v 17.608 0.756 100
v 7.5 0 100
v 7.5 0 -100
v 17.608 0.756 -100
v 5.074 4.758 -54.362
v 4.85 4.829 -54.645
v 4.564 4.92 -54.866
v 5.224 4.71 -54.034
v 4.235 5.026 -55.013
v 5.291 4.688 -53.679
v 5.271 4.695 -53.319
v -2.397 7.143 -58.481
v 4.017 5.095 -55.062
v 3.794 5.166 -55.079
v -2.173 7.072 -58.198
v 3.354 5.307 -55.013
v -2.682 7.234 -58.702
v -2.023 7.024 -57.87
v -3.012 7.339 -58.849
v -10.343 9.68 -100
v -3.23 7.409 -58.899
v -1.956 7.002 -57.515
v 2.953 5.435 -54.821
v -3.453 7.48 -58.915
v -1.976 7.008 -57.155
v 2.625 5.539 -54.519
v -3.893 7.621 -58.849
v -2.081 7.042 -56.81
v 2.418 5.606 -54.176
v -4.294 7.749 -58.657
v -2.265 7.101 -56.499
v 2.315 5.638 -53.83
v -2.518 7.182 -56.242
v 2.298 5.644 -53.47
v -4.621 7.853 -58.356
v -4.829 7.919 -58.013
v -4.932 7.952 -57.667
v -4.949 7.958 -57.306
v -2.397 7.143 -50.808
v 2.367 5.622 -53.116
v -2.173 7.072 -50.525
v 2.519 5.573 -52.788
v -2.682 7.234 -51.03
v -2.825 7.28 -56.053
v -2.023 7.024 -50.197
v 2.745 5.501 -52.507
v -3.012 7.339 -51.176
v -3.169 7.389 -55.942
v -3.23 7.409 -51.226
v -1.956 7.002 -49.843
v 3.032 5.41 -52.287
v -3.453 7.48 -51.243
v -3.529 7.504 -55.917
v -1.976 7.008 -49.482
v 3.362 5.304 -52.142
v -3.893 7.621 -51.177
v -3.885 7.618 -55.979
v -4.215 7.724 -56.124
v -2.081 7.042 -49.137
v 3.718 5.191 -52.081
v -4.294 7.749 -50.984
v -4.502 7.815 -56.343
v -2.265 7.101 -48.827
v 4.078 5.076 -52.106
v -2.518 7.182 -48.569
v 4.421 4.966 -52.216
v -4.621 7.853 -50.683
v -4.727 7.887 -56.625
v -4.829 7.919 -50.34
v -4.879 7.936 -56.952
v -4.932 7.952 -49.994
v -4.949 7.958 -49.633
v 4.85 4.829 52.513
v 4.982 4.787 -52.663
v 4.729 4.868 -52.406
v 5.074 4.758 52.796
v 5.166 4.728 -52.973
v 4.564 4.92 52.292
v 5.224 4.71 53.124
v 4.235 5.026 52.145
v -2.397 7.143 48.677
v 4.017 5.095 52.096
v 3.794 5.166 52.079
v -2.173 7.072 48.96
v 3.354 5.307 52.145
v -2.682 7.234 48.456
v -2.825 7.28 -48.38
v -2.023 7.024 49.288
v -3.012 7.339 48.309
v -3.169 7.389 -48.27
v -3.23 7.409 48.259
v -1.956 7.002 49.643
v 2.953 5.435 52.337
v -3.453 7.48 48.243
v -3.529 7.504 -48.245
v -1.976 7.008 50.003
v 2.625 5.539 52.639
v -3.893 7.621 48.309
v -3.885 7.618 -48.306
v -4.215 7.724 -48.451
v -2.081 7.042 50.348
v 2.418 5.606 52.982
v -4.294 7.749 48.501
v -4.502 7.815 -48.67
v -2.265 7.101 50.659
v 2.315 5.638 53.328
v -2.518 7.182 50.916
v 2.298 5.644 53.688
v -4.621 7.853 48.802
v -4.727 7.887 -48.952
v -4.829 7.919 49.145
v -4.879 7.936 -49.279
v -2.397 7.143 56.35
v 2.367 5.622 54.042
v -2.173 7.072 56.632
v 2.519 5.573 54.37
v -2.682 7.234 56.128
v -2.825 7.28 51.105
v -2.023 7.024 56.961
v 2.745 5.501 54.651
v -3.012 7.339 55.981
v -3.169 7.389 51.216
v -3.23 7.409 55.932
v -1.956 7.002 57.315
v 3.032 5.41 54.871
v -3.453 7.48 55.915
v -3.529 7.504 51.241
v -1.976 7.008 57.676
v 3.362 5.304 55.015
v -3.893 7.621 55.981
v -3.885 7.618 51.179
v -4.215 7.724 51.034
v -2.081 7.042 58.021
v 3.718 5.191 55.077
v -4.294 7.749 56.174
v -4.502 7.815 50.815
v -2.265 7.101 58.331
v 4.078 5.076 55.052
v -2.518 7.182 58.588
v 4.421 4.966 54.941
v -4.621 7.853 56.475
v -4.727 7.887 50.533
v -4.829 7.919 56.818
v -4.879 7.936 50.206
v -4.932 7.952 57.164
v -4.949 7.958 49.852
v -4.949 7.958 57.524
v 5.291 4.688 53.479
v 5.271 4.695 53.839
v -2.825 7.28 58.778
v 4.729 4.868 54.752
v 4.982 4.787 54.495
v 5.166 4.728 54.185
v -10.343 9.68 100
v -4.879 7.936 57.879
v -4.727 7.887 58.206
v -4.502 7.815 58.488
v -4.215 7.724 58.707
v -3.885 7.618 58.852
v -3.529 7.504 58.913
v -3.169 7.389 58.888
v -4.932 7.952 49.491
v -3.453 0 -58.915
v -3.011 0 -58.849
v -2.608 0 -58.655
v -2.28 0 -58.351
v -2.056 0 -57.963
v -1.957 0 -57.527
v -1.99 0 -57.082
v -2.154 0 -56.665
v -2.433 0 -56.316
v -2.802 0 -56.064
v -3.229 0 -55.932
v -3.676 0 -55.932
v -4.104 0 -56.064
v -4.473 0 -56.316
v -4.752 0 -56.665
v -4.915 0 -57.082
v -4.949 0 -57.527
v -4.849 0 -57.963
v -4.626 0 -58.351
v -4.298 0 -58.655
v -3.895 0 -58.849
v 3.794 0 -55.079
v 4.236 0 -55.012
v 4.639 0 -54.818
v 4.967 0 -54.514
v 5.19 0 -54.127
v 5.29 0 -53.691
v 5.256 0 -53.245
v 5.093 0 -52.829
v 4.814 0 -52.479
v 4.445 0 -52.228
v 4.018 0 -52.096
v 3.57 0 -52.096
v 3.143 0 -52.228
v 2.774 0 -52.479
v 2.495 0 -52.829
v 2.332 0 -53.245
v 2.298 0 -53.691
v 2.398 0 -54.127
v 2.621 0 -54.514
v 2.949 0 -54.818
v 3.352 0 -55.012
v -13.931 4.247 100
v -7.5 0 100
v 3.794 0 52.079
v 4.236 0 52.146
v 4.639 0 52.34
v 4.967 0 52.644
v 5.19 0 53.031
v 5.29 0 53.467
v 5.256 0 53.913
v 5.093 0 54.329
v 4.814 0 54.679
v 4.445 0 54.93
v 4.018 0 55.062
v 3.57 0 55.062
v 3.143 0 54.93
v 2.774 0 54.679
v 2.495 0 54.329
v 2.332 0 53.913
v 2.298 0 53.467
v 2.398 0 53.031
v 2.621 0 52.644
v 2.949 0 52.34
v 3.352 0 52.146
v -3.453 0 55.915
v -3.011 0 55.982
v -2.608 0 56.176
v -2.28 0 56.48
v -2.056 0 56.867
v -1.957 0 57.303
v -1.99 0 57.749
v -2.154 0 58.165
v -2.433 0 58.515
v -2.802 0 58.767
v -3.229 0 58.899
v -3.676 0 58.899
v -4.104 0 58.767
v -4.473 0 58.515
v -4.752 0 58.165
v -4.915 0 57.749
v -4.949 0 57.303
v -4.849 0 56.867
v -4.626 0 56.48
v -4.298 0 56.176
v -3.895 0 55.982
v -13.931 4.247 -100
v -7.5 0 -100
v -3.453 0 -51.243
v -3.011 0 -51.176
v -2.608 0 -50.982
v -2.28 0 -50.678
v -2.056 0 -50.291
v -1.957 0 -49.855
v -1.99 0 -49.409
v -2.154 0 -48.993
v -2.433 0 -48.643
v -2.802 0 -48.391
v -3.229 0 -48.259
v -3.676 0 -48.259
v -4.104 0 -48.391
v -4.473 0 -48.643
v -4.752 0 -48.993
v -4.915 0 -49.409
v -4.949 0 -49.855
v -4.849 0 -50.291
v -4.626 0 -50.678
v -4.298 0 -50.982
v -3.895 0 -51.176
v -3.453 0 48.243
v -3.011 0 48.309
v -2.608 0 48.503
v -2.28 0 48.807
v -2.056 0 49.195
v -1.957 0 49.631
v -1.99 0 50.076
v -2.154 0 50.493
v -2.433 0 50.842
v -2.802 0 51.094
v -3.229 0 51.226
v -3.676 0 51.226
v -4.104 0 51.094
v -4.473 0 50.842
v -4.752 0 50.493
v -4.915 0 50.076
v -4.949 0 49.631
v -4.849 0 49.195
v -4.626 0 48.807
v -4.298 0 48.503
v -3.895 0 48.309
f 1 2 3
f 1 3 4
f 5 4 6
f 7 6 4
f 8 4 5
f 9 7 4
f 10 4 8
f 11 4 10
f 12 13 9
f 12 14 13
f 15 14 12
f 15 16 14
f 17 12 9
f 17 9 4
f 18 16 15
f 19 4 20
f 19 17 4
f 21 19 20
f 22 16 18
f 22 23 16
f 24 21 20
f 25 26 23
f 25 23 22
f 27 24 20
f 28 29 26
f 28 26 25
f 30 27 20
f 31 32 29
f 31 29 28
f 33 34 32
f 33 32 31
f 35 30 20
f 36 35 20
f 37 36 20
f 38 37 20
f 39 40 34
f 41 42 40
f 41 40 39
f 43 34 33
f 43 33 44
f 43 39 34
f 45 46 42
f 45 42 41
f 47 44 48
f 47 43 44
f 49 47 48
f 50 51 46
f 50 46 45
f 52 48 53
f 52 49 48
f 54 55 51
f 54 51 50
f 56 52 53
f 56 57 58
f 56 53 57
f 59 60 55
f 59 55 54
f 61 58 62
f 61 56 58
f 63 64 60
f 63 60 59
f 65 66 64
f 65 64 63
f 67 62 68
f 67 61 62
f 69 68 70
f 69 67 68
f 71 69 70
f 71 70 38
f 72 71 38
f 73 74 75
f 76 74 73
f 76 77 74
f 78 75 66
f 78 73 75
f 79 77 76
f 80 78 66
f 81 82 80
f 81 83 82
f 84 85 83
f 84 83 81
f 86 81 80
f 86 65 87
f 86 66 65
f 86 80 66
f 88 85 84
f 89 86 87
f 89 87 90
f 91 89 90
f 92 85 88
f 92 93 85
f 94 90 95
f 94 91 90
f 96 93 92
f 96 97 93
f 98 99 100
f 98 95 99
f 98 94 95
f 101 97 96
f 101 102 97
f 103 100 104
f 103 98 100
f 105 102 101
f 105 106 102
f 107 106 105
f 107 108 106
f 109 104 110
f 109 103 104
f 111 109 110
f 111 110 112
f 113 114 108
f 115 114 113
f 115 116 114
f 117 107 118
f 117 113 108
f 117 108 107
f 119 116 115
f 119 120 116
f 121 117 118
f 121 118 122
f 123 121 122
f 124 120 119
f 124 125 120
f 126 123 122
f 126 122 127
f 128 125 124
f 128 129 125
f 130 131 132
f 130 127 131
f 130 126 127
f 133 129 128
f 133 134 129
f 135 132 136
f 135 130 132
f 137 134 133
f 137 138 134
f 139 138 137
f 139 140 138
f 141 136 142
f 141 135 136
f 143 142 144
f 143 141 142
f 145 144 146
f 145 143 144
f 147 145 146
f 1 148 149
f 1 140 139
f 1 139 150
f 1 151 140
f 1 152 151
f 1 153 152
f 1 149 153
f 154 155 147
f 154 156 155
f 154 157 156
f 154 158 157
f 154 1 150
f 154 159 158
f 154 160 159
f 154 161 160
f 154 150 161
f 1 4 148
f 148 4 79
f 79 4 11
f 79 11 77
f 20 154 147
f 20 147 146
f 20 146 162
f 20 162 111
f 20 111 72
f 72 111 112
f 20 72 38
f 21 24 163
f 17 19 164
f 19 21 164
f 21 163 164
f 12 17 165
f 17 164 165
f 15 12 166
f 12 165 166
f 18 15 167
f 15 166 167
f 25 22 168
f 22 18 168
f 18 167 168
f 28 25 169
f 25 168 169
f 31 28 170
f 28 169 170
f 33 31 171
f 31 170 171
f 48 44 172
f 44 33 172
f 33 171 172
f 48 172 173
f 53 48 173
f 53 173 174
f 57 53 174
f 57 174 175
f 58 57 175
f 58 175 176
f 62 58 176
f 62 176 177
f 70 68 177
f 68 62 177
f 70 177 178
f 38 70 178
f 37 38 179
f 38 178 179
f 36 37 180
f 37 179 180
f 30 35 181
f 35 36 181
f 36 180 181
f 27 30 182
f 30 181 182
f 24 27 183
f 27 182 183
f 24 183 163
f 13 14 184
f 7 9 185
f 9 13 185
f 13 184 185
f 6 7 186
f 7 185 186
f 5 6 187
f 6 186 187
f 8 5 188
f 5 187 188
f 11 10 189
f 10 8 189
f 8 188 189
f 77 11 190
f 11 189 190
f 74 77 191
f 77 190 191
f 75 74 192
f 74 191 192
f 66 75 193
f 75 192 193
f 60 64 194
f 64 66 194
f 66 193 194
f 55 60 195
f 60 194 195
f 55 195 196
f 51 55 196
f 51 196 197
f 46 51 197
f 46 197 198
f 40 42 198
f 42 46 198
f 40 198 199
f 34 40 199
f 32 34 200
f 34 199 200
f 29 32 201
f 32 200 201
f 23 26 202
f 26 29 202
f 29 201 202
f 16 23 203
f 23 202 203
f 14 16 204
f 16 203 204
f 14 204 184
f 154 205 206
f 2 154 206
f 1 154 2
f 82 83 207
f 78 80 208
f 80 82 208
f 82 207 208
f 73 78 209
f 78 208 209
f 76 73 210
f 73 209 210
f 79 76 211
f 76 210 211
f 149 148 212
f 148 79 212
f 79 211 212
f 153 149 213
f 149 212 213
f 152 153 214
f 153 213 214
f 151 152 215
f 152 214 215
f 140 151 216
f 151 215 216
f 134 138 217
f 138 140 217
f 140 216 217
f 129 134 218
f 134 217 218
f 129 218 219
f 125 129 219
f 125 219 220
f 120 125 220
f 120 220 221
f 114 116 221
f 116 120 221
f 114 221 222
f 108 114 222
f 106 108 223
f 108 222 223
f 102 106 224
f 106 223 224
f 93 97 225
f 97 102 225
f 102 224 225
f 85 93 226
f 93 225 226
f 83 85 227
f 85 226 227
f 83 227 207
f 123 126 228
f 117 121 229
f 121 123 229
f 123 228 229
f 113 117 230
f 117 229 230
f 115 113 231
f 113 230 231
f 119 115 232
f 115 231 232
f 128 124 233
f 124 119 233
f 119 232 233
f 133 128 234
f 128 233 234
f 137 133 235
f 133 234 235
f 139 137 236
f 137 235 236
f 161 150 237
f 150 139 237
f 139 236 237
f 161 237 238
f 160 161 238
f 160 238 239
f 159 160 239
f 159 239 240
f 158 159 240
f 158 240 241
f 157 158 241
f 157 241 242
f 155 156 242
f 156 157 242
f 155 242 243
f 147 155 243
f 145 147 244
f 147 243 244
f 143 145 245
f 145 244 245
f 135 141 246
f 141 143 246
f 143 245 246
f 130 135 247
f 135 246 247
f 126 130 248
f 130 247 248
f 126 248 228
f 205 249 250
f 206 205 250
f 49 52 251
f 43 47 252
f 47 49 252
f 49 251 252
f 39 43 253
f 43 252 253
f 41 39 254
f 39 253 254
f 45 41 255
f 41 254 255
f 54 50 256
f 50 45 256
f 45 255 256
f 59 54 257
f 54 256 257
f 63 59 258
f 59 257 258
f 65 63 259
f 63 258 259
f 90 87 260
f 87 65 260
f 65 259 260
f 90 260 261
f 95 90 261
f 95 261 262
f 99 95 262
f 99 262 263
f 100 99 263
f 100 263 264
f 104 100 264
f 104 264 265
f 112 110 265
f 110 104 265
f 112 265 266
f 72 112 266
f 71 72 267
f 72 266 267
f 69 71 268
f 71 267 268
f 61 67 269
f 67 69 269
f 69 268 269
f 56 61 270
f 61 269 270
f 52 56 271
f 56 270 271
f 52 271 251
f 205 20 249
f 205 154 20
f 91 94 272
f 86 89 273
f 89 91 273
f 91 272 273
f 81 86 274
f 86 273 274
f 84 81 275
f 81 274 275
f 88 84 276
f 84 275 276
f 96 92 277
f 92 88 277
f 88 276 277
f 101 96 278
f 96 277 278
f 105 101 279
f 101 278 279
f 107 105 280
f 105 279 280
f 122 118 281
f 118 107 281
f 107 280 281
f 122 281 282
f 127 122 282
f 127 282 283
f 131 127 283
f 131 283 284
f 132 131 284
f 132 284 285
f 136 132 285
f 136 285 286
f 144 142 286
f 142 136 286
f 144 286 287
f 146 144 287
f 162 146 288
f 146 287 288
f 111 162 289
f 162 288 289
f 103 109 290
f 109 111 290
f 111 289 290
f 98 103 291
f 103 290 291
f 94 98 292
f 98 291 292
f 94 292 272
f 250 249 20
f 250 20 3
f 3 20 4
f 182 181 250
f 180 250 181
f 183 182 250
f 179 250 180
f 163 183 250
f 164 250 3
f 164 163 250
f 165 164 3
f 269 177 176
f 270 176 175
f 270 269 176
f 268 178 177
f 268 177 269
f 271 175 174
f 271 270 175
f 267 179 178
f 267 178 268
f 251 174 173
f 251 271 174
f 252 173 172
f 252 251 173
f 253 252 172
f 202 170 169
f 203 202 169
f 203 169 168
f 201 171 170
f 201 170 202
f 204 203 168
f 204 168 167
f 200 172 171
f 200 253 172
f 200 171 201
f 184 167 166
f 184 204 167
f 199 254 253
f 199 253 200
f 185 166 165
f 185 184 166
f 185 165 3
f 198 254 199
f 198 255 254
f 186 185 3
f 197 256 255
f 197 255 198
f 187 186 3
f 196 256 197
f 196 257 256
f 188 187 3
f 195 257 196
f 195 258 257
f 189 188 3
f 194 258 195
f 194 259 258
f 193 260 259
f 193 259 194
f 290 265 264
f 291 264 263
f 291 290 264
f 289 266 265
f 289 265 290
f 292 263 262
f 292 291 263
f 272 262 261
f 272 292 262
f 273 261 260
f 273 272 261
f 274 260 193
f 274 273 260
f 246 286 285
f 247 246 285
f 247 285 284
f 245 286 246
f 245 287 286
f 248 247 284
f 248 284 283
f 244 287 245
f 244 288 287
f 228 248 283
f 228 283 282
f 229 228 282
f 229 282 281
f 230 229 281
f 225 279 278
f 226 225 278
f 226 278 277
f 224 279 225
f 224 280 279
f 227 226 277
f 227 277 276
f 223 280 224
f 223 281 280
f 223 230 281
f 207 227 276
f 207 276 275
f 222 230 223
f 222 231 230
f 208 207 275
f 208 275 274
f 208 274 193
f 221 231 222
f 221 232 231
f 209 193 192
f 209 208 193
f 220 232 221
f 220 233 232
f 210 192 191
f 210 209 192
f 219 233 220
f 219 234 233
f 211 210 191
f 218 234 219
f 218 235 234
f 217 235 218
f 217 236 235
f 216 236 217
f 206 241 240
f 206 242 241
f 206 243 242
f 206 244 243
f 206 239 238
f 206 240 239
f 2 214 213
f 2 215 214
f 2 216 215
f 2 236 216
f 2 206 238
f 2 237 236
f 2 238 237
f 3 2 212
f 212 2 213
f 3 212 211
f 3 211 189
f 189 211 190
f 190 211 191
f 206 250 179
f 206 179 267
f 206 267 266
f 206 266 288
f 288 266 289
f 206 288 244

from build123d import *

# Parameters (mm, degrees)
EXTRUDE_1_DEPTH     = 100
SKETCH_2_R          = 1.5
CUT_EXTRUDE_1_DEPTH = 102.998720838


with BuildPart() as part:
    # 草图1 → 凸台-拉伸1 (new, symmetric)
    with BuildSketch(Plane.XY):
        Polygon((-7.5, 0), (7.5, 0), (17.60781312, 0.755729128), (-10.342998863, 9.680081085), (-13.930964167, 4.246815329), align=None)
    extrude(amount=EXTRUDE_1_DEPTH, both=True)

    # 草图2 → 切除-拉伸1 (cut, through all)
    with BuildSketch(Plane.XZ):
        with Locations(Location((3.794045685, 53.578973455, 0), (0, 0, 270))):
            Circle(SKETCH_2_R)
        with Locations(Location((3.794045685, -53.578973455, 0), (0, 0, 270))):
            Circle(SKETCH_2_R)
        with Locations(Location((-3.452778586, 57.415298026, 0), (0, 0, 270))):
            Circle(SKETCH_2_R)
        with Locations(Location((-3.452778586, 49.742648885, 0), (0, 0, 270))):
            Circle(SKETCH_2_R)
        with Locations(Location((-3.452778586, -49.742648885, 0), (0, 0, 270))):
            Circle(SKETCH_2_R)
        with Locations(Location((-3.452778586, -57.415298026, 0), (0, 0, 270))):
            Circle(SKETCH_2_R)
    extrude(amount=-CUT_EXTRUDE_1_DEPTH, mode=Mode.SUBTRACT)


solid = part.part
